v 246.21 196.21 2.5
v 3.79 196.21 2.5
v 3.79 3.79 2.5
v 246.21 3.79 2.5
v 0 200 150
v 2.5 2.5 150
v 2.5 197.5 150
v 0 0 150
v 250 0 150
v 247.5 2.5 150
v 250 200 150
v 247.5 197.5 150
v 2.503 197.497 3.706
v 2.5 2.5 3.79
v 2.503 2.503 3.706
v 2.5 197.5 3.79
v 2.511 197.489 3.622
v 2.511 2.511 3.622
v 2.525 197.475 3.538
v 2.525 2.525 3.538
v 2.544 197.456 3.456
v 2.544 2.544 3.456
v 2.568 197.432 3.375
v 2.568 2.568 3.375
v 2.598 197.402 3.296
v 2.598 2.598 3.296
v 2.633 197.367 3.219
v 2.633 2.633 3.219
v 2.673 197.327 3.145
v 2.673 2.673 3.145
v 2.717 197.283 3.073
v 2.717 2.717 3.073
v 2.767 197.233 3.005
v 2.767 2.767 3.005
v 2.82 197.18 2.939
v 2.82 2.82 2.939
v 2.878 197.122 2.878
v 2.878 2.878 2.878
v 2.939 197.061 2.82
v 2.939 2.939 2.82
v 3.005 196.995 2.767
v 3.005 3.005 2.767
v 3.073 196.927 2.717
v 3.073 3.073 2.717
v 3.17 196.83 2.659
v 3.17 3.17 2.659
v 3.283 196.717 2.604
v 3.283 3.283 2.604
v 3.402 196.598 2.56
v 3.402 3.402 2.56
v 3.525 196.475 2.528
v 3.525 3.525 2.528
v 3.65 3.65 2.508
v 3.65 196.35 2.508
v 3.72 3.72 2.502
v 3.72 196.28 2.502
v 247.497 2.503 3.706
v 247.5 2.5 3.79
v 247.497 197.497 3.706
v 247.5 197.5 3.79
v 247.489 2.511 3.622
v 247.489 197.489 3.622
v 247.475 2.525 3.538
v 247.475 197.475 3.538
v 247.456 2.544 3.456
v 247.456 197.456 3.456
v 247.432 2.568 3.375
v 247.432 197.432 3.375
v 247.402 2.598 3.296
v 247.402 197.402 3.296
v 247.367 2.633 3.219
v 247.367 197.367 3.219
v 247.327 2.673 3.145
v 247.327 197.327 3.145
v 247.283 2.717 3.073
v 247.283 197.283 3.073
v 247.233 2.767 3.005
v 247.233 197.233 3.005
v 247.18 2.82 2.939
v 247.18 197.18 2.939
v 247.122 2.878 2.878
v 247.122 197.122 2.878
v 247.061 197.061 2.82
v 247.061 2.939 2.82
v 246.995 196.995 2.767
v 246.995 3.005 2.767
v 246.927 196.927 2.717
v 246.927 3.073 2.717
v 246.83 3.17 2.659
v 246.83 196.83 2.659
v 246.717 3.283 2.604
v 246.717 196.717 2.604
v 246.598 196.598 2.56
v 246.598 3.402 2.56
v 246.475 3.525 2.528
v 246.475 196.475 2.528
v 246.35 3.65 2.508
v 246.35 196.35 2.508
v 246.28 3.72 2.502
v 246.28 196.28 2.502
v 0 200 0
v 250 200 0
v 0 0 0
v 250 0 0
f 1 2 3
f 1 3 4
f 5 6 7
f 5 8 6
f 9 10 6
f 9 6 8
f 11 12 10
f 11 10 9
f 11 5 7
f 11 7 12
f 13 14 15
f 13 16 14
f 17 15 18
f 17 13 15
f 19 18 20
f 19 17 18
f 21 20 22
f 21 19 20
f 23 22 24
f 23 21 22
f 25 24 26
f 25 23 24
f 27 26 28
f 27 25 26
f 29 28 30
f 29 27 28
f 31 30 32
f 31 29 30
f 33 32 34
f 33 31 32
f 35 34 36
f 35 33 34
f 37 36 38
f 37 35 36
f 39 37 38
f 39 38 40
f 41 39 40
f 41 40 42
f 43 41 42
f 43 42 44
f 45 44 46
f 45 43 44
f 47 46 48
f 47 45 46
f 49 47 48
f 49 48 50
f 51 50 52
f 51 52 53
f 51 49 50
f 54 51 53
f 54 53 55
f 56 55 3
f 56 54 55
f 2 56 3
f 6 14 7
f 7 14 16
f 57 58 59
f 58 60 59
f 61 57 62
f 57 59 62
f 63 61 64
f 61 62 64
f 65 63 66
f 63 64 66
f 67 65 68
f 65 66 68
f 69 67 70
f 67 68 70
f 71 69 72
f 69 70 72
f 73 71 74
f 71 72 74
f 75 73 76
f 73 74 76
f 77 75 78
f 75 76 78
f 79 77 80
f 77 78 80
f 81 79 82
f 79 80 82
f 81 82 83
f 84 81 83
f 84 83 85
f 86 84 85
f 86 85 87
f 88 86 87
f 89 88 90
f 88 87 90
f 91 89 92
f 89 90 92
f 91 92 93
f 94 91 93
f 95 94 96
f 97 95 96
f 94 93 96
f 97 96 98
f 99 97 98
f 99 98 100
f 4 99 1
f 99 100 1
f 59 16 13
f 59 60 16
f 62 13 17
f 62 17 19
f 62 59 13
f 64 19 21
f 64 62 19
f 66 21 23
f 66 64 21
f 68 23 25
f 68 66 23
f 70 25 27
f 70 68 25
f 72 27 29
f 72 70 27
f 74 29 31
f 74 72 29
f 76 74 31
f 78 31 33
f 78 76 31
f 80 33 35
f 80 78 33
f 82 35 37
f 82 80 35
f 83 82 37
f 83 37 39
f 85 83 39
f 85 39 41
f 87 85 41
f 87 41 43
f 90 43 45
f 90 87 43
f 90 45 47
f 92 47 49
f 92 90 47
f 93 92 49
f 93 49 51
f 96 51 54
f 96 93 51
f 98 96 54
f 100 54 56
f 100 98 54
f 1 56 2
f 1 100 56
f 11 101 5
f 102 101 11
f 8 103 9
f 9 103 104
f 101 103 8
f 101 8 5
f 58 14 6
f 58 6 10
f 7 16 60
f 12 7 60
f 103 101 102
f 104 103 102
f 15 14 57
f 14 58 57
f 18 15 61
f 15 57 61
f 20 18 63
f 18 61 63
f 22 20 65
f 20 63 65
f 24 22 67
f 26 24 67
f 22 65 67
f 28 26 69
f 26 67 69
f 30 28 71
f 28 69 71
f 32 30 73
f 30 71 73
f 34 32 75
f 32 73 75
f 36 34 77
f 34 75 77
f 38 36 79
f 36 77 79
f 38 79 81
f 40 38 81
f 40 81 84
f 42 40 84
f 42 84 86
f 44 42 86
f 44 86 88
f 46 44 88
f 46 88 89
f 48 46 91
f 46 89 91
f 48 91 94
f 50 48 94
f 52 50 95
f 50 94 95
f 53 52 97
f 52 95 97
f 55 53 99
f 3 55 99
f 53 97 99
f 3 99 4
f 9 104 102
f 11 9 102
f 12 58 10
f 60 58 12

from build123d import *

# Parameters (mm, degrees)
F0_W     = 250
F0_H     = 200
F1_DEPTH = 150
F2_T     = -2.5
F3_R     = 1.29


with BuildPart() as f1:
    # F0 (on Top) → F1 (new body)
    with BuildSketch(Plane.XY):
        with Locations((125, 100)):
            Rectangle(F0_W, F0_H)
    extrude(amount=F1_DEPTH)

    # F2
    f2_openings = [f1.faces().sort_by_distance(p)[0] for p in [
        (125, 100, 150),
    ]]
    offset(amount=F2_T, openings=f2_openings)

    # F3
    f3_edges = [f1.edges().sort_by_distance(p)[0] for p in [
        (2.5, 100, 2.5),
        (125, 197.5, 2.5),
        (247.5, 100, 2.5),
        (125, 2.5, 2.5),
    ]]
    fillet(f3_edges, radius=F3_R)


solid = f1.part
